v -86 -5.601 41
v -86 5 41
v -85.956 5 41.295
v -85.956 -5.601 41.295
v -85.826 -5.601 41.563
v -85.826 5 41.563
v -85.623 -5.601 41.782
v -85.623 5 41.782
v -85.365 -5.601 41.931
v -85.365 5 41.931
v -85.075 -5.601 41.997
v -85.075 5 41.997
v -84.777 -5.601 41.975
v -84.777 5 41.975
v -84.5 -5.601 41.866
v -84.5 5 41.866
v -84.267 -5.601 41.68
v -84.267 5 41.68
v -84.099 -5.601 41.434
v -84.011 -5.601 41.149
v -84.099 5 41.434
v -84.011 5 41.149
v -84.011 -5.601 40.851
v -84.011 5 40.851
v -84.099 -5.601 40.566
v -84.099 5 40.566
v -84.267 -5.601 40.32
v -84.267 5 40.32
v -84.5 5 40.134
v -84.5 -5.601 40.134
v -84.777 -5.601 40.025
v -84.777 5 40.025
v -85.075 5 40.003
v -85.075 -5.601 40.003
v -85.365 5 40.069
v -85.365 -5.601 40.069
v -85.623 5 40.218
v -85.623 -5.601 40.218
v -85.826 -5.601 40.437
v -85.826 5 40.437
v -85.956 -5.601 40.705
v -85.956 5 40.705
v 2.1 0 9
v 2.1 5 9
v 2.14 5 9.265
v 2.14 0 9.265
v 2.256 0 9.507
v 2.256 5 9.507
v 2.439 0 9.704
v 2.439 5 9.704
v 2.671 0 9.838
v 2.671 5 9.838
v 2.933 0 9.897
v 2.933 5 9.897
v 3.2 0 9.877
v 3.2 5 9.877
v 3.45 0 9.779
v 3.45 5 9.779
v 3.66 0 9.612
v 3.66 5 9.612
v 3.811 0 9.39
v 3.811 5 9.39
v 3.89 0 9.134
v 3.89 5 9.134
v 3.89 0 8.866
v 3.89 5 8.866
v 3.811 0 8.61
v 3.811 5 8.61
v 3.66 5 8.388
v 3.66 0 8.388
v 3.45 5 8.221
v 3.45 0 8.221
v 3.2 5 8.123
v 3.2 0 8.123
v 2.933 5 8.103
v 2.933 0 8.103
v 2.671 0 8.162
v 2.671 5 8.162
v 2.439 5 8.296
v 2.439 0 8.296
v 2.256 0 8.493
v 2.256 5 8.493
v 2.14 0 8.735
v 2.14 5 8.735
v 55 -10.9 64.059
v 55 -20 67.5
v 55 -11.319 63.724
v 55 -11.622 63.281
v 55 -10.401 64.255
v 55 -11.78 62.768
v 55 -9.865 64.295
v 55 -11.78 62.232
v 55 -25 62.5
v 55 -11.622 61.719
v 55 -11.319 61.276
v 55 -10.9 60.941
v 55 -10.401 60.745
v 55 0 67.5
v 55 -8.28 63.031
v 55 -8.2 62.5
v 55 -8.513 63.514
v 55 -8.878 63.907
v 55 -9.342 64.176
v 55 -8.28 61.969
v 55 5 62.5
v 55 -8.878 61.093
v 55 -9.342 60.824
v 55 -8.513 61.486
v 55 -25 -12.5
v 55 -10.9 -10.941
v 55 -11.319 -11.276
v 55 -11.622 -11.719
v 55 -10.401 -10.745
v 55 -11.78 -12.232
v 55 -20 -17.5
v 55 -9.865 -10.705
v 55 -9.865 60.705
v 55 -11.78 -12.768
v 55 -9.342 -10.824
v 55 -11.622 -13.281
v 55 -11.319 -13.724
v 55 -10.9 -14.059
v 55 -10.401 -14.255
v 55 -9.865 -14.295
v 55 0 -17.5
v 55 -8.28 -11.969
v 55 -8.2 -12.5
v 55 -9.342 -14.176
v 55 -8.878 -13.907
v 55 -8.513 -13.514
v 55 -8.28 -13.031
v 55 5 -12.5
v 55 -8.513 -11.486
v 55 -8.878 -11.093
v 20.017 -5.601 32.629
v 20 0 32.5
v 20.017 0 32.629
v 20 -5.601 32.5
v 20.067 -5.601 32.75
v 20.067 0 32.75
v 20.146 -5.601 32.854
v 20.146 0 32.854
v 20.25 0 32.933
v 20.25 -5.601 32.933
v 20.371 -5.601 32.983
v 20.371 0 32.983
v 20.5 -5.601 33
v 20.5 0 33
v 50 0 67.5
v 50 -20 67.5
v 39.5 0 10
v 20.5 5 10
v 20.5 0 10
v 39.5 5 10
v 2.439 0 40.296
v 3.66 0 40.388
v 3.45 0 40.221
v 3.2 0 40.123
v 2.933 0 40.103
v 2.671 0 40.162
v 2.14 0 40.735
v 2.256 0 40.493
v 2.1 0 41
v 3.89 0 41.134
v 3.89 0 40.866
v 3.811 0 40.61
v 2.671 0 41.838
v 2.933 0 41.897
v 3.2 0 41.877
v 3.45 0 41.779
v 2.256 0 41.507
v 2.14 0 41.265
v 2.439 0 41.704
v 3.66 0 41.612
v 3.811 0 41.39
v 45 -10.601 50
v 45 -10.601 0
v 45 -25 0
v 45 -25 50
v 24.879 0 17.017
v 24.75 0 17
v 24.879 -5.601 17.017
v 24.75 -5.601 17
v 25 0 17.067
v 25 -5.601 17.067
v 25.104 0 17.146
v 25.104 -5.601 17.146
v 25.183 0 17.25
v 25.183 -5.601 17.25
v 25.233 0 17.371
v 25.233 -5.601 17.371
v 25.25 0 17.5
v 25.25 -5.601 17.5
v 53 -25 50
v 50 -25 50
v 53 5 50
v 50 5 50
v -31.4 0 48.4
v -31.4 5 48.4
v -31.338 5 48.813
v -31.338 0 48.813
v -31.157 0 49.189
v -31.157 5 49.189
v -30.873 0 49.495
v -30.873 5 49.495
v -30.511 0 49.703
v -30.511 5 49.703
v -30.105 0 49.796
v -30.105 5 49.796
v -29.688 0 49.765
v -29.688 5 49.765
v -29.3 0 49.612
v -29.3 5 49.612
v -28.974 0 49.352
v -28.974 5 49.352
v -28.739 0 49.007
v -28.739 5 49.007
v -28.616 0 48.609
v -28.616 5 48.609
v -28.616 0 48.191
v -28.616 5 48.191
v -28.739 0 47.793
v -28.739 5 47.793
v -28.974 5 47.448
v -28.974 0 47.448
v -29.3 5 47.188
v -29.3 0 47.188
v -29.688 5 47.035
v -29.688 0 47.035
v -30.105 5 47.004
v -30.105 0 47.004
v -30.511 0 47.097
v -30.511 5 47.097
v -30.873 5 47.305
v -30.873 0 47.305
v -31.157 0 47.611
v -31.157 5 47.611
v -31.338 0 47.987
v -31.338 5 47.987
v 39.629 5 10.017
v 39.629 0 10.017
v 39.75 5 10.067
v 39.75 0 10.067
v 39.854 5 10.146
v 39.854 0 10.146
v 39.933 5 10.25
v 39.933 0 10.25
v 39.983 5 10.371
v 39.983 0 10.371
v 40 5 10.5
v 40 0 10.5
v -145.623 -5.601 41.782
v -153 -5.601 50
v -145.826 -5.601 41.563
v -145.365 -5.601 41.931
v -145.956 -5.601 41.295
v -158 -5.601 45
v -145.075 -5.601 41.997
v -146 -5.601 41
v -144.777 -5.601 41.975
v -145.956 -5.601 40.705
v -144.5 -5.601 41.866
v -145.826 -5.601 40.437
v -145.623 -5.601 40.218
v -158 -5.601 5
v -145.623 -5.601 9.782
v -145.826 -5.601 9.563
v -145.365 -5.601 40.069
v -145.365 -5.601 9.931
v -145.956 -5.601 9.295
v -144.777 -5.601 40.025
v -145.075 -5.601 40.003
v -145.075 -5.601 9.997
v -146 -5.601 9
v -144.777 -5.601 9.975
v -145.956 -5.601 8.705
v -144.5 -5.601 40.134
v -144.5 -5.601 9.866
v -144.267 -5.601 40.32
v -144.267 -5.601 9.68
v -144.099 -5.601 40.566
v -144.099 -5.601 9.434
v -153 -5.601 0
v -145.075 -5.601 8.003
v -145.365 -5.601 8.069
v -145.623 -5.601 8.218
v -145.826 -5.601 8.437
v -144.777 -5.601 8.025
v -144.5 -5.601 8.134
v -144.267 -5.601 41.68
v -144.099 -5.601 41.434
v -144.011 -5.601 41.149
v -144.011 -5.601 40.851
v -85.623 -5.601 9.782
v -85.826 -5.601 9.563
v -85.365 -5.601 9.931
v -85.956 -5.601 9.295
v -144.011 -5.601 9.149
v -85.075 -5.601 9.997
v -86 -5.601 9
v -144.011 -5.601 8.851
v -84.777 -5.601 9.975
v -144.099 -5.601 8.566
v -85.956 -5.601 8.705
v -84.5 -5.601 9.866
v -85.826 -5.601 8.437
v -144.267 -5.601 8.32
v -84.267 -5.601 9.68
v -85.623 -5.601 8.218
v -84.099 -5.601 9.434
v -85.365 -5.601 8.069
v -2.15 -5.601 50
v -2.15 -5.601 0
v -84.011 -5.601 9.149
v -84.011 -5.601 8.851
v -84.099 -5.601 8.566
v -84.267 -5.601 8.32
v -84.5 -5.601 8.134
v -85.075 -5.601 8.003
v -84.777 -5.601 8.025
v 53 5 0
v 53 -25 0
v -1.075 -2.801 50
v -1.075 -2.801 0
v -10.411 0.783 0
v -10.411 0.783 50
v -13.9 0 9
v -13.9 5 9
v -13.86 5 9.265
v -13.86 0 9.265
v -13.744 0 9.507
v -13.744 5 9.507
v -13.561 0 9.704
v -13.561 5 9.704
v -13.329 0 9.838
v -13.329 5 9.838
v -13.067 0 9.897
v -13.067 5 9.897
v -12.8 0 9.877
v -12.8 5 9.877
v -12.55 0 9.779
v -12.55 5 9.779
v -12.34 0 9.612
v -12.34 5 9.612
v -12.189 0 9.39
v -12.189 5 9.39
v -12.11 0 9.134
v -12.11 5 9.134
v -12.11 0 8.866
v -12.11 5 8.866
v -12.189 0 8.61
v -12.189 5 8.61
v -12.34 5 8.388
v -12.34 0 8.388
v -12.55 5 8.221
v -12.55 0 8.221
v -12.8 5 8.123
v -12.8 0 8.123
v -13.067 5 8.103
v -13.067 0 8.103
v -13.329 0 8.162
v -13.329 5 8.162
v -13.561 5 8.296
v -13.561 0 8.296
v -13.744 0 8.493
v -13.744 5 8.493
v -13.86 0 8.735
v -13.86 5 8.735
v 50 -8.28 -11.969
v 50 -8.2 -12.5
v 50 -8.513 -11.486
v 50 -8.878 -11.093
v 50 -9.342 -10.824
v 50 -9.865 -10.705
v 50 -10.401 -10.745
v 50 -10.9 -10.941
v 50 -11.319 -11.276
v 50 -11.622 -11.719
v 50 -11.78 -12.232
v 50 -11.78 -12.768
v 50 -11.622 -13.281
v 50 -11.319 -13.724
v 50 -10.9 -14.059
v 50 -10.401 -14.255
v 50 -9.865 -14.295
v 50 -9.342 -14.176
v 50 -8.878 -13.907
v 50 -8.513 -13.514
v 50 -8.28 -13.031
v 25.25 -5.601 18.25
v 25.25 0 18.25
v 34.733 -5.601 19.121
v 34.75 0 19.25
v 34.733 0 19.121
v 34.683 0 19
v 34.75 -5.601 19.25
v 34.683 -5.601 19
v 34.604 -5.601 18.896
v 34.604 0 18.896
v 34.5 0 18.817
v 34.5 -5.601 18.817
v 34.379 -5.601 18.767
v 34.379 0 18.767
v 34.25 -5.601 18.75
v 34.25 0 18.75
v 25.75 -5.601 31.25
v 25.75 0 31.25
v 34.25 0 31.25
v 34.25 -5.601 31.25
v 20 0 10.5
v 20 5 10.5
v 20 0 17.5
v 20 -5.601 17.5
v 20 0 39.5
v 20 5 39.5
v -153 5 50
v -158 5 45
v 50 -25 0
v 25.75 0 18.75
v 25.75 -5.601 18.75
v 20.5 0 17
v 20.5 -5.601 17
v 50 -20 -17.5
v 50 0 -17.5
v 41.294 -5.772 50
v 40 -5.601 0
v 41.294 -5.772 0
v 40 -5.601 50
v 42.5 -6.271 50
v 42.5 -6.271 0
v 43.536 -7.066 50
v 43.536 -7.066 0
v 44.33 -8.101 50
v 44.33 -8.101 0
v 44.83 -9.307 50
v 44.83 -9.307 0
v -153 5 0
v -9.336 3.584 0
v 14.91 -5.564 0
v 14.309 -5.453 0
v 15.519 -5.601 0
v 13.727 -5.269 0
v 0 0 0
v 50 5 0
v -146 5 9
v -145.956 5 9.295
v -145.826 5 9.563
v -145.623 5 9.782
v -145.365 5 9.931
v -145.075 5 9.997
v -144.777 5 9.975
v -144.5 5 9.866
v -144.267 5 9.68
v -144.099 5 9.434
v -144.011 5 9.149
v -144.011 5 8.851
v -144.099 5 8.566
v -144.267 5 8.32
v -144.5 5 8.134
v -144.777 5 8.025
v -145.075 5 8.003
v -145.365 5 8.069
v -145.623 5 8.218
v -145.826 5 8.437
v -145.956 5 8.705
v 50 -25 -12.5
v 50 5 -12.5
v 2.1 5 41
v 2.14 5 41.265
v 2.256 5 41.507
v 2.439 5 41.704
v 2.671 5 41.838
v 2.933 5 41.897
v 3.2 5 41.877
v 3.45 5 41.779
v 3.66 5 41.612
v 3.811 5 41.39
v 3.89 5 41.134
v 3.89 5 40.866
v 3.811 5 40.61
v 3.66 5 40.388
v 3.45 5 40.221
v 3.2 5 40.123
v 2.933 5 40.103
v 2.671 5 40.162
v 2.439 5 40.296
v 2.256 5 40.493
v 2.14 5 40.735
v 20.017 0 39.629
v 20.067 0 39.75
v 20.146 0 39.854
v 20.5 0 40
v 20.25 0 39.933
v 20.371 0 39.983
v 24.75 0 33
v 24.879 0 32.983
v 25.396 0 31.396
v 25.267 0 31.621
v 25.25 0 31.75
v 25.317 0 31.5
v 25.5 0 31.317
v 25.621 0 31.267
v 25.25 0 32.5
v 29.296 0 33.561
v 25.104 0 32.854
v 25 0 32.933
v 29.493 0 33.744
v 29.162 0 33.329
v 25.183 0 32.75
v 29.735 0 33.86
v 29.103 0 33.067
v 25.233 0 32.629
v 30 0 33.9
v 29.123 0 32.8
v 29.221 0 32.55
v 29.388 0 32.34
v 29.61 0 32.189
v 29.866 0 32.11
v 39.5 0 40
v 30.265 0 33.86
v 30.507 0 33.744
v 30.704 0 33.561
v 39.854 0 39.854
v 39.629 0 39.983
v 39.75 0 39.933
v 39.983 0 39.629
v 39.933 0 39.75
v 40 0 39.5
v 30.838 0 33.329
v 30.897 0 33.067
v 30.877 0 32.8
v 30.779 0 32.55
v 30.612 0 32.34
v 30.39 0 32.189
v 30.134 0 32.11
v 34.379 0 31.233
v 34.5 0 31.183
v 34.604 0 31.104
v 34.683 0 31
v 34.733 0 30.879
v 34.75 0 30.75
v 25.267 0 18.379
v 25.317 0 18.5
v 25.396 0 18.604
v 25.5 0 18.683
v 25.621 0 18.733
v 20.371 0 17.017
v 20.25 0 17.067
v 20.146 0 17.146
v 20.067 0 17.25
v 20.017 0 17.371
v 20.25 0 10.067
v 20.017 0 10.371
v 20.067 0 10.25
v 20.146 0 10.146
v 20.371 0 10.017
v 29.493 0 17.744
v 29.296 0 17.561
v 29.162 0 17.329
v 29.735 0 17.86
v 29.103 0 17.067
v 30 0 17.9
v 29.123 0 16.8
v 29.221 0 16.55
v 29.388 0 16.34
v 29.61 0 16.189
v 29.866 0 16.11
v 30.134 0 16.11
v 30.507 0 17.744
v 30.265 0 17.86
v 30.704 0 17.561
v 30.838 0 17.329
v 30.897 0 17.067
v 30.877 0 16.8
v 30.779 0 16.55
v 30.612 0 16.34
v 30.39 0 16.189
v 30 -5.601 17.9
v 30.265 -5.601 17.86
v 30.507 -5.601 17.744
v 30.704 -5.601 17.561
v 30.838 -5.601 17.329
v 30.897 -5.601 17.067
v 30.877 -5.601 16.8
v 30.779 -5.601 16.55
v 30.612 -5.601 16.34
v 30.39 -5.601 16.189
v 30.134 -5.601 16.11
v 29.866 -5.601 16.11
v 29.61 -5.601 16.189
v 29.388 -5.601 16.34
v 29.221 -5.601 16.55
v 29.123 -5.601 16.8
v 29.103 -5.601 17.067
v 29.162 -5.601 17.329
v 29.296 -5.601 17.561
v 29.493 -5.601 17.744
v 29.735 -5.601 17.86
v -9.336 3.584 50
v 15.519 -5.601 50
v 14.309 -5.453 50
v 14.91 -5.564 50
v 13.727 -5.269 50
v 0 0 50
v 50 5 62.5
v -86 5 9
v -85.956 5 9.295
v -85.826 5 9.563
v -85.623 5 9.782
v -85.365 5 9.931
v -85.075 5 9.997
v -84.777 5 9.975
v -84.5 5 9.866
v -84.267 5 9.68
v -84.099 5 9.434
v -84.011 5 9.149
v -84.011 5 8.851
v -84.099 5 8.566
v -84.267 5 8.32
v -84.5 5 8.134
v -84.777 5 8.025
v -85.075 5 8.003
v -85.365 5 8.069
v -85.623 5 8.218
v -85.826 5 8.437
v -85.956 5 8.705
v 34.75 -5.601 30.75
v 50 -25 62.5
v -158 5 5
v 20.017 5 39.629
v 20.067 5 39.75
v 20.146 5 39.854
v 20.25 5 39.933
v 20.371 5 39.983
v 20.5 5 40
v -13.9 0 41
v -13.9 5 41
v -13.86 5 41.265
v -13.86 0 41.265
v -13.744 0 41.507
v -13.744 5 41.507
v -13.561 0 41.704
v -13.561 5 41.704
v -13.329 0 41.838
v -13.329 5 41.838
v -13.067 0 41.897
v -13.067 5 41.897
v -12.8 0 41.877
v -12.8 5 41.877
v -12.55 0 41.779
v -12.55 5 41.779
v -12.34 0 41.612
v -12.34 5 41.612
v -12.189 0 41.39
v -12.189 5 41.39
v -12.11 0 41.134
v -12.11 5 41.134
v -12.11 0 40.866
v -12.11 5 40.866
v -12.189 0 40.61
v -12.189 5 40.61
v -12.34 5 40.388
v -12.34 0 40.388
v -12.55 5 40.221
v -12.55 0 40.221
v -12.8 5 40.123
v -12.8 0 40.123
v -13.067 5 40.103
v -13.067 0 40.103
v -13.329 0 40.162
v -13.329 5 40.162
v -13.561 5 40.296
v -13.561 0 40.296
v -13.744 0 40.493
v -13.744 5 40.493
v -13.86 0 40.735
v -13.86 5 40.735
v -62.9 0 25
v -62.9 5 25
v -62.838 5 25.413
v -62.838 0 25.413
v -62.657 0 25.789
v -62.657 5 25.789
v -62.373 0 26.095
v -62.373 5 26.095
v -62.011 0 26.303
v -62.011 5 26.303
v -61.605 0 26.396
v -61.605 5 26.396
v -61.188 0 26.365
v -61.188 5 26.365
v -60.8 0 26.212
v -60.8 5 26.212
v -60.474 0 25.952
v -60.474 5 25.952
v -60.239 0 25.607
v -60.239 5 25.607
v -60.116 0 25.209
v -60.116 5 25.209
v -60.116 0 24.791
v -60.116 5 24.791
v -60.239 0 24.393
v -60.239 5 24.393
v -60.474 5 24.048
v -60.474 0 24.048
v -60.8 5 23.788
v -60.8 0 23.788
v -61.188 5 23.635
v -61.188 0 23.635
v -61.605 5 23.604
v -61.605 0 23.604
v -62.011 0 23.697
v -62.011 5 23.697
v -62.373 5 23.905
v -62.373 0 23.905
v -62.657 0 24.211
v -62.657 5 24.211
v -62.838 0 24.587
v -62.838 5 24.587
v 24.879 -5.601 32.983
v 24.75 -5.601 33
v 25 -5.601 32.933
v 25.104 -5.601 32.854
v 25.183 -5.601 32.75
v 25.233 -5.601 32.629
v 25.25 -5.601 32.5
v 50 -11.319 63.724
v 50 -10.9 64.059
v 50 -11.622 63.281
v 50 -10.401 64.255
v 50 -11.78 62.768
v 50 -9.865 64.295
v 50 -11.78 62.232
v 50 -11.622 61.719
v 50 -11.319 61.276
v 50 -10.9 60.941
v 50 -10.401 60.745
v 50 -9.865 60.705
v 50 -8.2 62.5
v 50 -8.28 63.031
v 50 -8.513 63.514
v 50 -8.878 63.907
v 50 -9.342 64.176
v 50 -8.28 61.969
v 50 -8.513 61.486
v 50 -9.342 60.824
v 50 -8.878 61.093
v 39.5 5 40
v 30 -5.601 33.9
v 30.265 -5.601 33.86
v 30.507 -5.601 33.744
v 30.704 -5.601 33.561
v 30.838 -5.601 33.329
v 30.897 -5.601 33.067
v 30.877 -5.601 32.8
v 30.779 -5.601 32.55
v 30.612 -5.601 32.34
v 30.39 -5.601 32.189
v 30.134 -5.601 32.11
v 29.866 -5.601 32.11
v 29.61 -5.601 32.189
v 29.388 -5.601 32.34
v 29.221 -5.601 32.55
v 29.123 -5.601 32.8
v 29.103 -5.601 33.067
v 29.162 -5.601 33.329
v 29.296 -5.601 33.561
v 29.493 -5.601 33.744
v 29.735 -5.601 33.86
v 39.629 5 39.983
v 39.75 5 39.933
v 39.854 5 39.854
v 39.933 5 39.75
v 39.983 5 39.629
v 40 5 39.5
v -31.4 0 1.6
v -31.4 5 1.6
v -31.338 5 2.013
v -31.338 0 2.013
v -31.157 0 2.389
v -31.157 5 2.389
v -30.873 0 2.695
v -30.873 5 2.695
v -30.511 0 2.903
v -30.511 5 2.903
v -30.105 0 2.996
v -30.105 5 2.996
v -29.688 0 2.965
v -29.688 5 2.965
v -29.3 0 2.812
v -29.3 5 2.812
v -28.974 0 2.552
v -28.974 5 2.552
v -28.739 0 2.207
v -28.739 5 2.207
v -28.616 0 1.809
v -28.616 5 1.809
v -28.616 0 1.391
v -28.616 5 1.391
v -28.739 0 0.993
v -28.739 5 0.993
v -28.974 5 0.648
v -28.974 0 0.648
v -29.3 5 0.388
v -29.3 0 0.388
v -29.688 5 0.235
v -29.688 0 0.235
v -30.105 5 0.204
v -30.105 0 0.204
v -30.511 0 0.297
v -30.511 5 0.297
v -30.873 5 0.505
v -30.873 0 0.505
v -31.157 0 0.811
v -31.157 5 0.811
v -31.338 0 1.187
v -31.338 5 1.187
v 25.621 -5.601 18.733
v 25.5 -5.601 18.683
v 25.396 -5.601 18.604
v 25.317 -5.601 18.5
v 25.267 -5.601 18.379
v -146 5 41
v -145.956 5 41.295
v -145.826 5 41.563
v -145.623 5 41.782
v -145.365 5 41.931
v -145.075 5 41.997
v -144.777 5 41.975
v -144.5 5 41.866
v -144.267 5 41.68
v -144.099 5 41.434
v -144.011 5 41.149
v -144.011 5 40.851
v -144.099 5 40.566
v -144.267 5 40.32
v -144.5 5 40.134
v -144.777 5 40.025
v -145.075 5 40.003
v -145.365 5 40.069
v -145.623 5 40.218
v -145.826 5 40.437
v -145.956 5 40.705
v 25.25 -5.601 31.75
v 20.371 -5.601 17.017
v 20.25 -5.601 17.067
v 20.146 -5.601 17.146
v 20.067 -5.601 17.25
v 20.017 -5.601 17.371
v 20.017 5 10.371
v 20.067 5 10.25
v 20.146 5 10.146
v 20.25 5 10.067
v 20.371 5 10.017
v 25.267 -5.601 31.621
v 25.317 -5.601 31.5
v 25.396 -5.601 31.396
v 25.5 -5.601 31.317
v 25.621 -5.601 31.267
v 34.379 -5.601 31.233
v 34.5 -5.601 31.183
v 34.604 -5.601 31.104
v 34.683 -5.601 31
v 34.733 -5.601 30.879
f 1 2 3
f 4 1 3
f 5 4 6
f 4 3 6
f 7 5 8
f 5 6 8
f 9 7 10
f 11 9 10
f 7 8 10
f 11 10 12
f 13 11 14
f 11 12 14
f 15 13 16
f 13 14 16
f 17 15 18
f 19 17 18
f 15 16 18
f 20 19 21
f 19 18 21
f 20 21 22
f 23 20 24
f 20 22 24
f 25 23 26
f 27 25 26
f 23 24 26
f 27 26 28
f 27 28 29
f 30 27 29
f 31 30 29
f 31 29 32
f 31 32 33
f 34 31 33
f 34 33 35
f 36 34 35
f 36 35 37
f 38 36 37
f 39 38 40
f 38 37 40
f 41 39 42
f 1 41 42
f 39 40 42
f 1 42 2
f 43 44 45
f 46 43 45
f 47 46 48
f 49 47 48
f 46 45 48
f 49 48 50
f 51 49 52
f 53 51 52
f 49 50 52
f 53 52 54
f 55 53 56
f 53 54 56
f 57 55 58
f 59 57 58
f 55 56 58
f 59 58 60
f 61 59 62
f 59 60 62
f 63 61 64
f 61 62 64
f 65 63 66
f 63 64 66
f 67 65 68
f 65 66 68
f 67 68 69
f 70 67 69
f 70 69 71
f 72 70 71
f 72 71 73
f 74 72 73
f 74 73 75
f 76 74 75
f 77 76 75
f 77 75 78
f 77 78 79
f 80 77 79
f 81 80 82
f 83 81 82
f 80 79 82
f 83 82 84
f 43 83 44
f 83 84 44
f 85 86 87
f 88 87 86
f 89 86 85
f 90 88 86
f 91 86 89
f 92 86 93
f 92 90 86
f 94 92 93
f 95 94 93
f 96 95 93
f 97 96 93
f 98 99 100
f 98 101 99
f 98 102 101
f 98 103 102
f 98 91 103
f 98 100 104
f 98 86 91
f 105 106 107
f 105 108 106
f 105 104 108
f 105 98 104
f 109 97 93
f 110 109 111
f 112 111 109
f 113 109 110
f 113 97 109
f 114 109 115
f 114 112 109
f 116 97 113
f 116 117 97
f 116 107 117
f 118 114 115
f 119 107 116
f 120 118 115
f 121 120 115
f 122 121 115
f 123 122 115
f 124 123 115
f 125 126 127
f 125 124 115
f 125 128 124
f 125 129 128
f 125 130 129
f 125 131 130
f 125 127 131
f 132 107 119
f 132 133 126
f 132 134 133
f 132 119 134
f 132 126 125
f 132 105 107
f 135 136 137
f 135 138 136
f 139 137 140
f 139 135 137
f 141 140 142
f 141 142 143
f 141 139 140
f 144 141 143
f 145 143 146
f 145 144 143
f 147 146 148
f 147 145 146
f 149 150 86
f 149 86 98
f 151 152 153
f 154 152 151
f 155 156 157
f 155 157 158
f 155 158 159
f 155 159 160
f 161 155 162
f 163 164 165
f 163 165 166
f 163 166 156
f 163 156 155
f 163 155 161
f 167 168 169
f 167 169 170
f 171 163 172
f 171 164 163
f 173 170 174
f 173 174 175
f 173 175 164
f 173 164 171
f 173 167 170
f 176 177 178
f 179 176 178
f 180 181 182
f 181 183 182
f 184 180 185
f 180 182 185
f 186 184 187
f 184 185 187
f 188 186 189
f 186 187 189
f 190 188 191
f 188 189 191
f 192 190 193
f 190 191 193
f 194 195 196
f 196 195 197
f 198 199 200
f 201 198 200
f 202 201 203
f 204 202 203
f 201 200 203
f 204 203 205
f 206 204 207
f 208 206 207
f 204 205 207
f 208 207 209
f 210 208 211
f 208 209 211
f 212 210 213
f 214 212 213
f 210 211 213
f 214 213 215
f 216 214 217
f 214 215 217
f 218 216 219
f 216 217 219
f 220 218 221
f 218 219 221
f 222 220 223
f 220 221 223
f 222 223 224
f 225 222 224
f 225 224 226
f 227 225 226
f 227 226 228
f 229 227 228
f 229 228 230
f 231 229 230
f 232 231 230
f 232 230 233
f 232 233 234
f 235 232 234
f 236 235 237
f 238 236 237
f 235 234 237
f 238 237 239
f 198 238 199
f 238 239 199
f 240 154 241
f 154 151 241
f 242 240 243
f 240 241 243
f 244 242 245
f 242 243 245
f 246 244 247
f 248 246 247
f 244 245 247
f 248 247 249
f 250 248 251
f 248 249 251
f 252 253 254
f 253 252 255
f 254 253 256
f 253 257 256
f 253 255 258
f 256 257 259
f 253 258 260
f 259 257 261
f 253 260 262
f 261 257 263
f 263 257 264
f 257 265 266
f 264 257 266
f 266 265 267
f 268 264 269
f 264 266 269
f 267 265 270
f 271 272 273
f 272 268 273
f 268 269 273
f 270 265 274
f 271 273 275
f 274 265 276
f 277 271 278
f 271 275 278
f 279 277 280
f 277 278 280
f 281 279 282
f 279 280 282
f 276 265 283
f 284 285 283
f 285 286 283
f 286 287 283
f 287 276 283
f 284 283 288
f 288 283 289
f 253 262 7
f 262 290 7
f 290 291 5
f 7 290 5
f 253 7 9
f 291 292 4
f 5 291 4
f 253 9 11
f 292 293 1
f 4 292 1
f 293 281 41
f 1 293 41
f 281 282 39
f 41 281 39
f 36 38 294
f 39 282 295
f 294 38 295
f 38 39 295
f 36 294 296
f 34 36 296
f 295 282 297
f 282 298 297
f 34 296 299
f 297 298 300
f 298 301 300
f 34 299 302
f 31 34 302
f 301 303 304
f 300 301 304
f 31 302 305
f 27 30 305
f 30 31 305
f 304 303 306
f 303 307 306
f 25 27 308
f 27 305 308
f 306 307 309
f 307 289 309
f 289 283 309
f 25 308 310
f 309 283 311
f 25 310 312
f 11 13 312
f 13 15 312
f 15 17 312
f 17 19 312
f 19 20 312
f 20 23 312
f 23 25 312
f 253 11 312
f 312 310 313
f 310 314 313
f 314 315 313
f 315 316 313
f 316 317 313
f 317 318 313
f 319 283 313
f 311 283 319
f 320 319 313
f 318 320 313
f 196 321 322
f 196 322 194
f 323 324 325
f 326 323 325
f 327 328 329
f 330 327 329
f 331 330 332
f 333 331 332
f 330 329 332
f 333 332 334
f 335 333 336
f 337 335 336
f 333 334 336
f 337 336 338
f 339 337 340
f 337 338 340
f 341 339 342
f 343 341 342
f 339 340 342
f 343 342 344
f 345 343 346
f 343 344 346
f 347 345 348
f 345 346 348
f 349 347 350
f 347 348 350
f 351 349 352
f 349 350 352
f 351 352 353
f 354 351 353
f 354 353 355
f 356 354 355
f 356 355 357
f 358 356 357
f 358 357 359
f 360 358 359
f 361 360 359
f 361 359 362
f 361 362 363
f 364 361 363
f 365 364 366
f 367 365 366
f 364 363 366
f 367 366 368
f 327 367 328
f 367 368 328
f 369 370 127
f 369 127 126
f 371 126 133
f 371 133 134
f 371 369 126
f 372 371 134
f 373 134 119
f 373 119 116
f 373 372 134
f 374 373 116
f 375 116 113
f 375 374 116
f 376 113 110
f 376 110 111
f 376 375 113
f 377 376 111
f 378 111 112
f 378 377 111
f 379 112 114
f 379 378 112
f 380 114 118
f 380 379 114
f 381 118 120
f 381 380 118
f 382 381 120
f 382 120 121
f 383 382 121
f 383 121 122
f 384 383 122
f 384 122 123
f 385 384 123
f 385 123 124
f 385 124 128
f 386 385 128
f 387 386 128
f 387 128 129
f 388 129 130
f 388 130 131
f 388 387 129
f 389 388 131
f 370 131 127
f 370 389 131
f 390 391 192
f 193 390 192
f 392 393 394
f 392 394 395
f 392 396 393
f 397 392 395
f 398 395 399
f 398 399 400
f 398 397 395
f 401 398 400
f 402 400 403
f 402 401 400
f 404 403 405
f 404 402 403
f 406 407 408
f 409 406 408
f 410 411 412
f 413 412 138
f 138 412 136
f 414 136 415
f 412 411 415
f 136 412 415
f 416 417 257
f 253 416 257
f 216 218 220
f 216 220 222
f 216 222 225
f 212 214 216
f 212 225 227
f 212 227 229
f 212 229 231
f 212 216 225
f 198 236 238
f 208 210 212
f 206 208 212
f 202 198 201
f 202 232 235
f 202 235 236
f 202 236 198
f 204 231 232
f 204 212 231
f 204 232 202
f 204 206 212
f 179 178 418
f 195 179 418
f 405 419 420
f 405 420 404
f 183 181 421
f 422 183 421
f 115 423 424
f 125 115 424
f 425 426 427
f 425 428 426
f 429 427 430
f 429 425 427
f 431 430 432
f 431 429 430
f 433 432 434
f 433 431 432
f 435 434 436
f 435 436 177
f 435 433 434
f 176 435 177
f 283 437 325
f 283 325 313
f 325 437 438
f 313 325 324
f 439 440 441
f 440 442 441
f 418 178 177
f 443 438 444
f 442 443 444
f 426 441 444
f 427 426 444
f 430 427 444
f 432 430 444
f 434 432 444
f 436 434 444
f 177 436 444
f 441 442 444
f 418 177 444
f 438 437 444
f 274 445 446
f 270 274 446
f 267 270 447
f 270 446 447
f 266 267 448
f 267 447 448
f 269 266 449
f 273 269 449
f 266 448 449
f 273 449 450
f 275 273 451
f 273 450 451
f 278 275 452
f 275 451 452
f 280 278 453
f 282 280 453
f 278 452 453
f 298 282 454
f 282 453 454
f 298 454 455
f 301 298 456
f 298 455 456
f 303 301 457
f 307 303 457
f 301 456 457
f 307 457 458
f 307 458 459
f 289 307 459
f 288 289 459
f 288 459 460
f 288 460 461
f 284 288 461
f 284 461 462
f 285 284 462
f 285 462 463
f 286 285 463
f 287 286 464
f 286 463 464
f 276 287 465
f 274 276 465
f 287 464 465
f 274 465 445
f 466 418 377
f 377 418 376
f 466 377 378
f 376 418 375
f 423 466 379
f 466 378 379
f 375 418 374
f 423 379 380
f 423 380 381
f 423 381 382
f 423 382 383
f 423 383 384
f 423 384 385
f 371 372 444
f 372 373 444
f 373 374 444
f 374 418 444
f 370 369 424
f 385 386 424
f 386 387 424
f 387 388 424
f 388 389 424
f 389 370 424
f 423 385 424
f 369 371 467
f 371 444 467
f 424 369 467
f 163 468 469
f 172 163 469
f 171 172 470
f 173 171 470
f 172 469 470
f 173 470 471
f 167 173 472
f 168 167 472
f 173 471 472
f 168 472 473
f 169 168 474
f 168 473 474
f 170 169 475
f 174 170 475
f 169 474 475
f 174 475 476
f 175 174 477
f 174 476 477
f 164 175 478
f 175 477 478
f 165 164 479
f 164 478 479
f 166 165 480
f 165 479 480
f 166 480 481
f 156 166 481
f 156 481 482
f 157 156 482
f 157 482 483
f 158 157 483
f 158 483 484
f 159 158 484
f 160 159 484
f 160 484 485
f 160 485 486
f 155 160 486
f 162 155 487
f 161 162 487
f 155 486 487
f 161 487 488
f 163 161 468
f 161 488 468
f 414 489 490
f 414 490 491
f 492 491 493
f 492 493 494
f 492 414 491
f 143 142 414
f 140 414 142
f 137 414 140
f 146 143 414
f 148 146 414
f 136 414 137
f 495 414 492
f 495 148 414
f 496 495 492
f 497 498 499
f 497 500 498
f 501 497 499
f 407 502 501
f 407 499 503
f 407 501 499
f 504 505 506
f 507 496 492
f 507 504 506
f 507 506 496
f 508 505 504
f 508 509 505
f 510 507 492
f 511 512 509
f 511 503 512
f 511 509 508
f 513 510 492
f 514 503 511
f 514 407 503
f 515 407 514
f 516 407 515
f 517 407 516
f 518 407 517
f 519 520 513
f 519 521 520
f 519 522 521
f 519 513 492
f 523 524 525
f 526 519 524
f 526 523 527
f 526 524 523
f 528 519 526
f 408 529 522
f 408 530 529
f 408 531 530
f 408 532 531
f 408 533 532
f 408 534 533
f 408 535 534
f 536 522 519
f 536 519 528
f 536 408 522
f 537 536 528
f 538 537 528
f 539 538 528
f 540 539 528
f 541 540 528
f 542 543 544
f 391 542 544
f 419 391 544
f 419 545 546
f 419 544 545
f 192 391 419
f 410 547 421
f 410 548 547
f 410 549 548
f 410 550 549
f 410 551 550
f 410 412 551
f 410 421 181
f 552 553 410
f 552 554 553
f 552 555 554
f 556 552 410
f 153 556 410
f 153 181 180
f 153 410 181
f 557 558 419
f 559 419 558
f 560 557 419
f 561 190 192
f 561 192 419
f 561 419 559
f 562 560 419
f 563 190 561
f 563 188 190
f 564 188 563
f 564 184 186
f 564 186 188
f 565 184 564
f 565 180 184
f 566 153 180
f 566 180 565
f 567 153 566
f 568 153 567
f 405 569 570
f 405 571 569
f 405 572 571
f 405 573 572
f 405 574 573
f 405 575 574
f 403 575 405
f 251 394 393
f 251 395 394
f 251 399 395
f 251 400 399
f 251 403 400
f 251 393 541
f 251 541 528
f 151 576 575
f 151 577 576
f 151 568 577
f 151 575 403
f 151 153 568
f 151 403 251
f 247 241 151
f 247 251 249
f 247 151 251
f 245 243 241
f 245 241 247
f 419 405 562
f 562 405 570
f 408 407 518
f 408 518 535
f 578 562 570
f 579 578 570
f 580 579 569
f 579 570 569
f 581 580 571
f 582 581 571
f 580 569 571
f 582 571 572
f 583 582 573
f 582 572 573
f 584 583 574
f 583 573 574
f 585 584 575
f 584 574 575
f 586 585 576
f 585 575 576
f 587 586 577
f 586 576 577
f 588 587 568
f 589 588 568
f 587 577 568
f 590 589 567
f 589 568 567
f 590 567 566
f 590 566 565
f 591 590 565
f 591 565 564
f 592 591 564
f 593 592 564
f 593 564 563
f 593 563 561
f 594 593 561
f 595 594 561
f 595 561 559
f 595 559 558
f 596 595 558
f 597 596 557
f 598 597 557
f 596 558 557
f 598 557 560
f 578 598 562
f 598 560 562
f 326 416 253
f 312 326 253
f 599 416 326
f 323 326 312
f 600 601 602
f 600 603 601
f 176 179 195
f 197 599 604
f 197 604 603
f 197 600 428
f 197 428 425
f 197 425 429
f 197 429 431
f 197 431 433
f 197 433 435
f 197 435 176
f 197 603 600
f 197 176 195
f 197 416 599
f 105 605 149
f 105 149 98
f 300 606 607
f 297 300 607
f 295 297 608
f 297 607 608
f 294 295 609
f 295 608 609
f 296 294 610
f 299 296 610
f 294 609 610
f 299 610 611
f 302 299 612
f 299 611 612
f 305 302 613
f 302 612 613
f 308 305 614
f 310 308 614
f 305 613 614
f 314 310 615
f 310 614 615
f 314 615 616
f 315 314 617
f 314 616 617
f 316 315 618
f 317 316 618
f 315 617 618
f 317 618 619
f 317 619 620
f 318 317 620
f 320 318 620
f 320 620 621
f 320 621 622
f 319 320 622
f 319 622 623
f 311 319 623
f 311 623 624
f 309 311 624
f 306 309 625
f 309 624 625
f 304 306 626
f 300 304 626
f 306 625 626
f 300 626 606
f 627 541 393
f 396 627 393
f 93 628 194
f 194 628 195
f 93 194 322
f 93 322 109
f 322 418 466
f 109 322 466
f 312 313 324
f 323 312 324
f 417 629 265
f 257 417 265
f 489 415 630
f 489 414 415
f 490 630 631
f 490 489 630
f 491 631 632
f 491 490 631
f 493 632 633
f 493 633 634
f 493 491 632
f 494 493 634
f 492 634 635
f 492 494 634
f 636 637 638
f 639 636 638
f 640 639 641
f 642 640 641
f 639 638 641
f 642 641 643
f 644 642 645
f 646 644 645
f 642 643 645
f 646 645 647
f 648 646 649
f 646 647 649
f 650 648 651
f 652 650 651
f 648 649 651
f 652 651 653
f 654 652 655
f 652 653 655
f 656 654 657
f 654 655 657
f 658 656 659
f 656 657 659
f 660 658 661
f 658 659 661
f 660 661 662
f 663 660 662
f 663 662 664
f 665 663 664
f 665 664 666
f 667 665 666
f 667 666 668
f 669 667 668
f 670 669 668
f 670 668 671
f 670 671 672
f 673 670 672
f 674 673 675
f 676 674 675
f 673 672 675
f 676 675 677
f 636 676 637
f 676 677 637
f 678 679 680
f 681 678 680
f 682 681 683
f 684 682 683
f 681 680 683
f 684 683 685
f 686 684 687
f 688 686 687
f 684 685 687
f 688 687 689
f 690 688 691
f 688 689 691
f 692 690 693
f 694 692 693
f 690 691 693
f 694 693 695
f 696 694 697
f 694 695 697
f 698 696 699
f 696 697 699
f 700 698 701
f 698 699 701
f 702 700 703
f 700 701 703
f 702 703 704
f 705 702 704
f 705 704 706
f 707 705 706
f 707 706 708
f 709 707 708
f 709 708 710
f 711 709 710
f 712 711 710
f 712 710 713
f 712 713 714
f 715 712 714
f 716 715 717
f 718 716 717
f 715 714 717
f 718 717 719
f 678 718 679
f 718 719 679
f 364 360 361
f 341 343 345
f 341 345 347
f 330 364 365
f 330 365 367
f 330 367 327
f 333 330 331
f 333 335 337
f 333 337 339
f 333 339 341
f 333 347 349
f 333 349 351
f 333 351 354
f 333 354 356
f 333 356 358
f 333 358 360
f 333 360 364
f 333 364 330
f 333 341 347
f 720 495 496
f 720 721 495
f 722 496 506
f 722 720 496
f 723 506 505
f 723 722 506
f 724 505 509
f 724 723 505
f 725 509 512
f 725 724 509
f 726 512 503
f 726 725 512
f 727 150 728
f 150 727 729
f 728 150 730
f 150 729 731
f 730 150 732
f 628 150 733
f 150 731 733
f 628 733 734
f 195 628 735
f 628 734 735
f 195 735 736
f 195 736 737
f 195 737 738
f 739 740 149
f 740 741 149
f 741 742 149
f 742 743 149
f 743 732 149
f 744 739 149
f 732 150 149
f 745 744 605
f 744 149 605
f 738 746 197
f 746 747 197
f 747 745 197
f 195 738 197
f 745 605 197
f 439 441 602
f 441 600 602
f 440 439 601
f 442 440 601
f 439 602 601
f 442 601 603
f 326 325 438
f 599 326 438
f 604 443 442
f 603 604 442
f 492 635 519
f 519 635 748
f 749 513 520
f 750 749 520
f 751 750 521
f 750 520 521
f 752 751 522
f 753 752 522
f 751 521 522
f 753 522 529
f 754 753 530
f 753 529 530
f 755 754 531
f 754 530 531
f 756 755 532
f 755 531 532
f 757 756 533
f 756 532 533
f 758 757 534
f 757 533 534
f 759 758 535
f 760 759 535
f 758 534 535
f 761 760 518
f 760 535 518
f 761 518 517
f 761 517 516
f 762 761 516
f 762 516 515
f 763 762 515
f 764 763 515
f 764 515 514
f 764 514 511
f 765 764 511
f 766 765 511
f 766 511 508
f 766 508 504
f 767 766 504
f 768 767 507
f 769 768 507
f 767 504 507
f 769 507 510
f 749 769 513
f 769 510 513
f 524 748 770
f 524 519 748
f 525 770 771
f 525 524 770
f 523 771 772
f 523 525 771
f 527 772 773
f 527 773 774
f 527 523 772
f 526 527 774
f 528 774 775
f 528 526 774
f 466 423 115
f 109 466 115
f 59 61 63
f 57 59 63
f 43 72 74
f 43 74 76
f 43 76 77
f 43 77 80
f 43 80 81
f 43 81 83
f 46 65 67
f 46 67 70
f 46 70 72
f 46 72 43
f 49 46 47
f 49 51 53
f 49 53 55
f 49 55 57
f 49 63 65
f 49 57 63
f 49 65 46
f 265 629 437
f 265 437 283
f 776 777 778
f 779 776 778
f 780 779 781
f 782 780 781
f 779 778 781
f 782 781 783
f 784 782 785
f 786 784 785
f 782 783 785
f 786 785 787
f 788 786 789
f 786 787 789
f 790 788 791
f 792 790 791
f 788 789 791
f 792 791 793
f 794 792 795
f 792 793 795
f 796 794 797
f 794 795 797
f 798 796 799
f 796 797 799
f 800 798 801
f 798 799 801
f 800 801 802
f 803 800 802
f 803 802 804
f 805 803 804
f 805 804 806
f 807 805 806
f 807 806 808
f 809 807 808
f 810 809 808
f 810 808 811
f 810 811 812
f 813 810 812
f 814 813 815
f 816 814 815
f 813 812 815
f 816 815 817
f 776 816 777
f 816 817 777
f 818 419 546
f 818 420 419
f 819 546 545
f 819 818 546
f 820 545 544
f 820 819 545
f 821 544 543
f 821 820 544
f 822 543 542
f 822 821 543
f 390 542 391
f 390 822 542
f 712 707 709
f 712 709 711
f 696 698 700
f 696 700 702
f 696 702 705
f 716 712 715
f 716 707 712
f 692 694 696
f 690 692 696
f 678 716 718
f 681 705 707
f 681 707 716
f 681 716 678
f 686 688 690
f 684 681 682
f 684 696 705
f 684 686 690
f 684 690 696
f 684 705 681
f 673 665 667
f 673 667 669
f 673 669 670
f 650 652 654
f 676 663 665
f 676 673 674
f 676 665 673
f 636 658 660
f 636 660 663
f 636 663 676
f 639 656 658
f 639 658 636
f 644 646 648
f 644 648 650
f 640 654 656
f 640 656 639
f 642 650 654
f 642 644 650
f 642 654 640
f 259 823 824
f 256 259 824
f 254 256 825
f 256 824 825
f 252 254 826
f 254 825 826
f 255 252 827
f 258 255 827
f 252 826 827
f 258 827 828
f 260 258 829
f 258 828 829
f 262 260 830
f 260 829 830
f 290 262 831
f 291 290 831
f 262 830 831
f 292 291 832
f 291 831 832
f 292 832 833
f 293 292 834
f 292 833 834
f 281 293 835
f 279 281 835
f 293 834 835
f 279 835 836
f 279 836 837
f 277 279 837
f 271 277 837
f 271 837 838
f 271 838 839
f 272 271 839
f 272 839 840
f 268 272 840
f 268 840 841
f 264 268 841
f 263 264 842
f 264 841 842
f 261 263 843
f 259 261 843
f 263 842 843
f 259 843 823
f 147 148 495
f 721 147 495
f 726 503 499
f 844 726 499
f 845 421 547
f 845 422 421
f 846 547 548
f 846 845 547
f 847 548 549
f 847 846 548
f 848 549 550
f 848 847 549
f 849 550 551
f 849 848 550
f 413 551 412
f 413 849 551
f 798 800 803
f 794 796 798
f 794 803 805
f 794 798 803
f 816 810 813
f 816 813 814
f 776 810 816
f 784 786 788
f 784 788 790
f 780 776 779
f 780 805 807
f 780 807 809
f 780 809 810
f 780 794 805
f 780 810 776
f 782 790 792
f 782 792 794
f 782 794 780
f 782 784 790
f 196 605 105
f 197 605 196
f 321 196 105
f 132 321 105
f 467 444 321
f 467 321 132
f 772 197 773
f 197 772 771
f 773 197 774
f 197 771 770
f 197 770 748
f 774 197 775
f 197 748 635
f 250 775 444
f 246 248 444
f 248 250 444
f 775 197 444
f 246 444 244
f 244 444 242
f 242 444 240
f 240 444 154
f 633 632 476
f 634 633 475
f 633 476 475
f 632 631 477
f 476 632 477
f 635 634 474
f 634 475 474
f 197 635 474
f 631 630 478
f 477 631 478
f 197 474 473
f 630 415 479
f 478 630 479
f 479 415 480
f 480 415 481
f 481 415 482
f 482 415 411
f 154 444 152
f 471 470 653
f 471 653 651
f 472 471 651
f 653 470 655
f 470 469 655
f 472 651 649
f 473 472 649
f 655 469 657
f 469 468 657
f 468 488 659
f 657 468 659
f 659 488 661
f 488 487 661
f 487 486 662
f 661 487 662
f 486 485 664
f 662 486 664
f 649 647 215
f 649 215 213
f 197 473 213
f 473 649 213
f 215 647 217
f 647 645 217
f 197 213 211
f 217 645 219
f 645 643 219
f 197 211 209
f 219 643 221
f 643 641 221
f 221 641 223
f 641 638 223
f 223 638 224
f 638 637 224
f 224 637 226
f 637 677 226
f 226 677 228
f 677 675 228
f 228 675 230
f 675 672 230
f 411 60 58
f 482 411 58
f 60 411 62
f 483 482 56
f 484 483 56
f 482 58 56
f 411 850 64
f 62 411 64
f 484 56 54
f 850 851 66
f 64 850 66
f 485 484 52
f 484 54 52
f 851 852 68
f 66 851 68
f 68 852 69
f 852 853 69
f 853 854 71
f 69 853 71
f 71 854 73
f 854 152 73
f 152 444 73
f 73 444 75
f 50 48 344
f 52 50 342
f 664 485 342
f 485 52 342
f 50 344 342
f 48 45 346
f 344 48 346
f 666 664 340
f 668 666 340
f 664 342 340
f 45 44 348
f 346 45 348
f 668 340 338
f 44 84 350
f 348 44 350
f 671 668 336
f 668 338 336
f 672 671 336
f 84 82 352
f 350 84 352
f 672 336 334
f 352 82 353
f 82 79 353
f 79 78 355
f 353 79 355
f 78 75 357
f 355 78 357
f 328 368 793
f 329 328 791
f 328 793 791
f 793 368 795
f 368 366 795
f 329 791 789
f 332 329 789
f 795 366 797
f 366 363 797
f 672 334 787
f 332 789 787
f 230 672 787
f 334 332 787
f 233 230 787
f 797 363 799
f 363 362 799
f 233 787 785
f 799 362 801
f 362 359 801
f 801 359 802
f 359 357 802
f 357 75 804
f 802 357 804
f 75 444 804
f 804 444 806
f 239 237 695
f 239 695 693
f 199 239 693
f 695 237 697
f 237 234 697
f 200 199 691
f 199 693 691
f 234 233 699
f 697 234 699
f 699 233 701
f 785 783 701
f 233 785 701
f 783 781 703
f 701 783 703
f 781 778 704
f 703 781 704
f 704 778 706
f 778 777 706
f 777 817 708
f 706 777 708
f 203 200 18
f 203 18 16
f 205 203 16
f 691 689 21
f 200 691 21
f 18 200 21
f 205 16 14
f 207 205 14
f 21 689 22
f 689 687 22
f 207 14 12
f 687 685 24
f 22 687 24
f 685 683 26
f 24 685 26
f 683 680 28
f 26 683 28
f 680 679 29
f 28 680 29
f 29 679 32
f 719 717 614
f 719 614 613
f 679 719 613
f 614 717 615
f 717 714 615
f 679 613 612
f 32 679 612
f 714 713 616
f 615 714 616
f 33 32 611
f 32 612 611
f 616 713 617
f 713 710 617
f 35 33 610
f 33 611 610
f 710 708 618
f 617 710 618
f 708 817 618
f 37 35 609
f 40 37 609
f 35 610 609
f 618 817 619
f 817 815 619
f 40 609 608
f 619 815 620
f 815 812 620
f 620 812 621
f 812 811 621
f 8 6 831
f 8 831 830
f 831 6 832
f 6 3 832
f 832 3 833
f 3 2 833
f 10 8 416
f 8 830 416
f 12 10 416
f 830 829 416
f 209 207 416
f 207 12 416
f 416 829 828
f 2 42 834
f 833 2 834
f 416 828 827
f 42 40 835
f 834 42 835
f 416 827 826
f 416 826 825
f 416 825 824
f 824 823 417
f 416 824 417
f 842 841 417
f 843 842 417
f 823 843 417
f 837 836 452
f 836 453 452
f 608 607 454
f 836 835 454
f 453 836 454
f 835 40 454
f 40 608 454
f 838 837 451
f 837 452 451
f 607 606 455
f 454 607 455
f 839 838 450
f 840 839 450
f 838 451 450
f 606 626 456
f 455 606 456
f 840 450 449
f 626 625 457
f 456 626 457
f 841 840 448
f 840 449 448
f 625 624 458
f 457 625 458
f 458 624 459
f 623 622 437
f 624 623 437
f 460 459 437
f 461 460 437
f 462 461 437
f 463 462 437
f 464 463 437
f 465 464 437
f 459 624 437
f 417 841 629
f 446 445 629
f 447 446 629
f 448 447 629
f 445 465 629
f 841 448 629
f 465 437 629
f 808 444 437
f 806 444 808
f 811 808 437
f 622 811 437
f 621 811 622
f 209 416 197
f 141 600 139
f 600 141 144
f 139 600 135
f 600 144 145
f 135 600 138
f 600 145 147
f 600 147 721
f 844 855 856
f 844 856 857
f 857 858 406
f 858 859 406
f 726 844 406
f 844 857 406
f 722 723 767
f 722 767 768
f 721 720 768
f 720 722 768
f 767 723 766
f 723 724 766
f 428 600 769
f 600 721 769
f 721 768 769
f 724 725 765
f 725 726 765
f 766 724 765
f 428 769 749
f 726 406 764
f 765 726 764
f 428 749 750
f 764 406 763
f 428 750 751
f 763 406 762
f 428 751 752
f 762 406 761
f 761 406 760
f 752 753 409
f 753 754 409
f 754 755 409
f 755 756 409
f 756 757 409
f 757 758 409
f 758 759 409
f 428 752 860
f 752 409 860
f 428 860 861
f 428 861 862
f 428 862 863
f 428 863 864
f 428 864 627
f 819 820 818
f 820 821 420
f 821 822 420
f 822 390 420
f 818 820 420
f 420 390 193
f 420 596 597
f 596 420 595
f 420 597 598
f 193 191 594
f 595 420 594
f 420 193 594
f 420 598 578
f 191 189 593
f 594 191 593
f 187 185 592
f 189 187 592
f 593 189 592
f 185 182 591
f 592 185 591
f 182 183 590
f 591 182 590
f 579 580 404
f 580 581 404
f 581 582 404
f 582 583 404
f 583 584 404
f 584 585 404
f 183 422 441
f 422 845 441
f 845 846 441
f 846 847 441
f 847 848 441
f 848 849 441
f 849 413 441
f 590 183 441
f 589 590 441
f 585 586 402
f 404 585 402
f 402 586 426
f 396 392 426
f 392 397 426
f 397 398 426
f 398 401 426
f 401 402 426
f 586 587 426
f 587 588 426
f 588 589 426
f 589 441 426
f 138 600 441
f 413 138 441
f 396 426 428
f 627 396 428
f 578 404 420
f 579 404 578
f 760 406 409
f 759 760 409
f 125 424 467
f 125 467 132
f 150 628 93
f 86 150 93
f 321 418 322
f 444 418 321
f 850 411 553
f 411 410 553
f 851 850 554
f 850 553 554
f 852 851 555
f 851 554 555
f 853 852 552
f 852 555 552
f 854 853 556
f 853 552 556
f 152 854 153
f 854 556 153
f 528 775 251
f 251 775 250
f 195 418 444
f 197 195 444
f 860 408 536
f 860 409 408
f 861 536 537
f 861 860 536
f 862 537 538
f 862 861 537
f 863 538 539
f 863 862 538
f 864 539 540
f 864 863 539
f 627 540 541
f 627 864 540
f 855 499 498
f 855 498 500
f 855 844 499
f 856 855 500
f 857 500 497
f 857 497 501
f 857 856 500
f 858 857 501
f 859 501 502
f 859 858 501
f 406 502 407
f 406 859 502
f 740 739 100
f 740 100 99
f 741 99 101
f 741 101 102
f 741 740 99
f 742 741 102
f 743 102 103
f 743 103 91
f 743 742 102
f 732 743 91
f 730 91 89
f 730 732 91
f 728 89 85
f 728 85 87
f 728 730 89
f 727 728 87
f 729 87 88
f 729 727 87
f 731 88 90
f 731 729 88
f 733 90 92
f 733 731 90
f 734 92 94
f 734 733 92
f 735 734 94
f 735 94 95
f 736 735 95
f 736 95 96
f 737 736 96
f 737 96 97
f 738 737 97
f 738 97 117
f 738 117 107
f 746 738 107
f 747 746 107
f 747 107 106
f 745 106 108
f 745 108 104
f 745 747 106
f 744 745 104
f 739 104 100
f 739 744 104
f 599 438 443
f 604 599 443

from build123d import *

# Parameters (mm, degrees)
BOSS_EXTRUDE1_DEPTH = 50
SKETCH3_W           = 85
SKETCH3_H           = 30
SKETCH3_R           = 1.8
BOSS_EXTRUDE2_DEPTH = 5
SKETCH4_W           = 50
SKETCH4_H           = 30
CUT_EXTRUDE1_DEPTH  = 3
SKETCH5_R           = 0.9
SKETCH5_R_2         = 1.4
SKETCH5_W           = 20
SKETCH5_H           = 30
CUT_EXTRUDE2_DEPTH  = 5
SKETCH7_W           = 9.5
SKETCH7_H           = 12.5
SKETCH7_R           = 0.9
CUT_EXTRUDE4_DEPTH  = 5.601482559
SKETCH8_R           = 1
CUT_EXTRUDE5_DEPTH  = 10.601482559
FILLET2_R           = 0.5
CHAMFER1_SIZE       = 5
FILLET1_R           = 5
CHAMFER2_SIZE       = 5


with BuildPart() as part:
    # Sketch1 → Boss-Extrude1 (new body)
    with BuildSketch(Plane.XY):
        Polygon((-9.335804265, 3.583679495), (0, 0), (14.59236096, -5.601482559), (45, -5.601482559), (45, -25), (50, -25), (50, 5), (0, 5), (-18, 5), (-158, 5), (-158, -5.601482559), (-2.150207697, -5.601482559), (-1.075103849, -2.800741279), (-10.410908114, 0.782938216), align=None)
    extrude(amount=BOSS_EXTRUDE1_DEPTH)

    # Sketch5 → Cut-Extrude2 (cut)
    with BuildSketch(Plane(origin=(0, 5, 0), x_dir=(1, 0, 0), z_dir=(0, 1, 0))):
        with Locations(Location((3, -9, 0), (0, 0, 180))):
            Circle(SKETCH5_R)
        with Locations(Location((-13, -9, 0), (0, 0, 180))):
            Circle(SKETCH5_R)
        with Locations(Location((-13, -41, 0), (0, 0, 180))):
            Circle(SKETCH5_R)
        with Locations(Location((3, -41, 0), (0, 0, 180))):
            Circle(SKETCH5_R)
        with Locations(Location((-30, -1.6, 0), (0, 0, 180))):
            Circle(SKETCH5_R_2)
        with Locations(Location((-30, -48.4, 0), (0, 0, 180))):
            Circle(SKETCH5_R_2)
        with Locations(Location((-61.5, -25, 0), (0, 0, 180))):
            Circle(SKETCH5_R_2)
        with Locations((30, -25)):
            Rectangle(SKETCH5_W, SKETCH5_H)
    extrude(amount=-CUT_EXTRUDE2_DEPTH, mode=Mode.SUBTRACT)

    # Sketch7 → Cut-Extrude4 (cut)
    with BuildSketch(Plane(origin=(0, 0, 0), x_dir=(1, 0, 0), z_dir=(0, 1, 0))):
        Polygon((25.25, -31.25), (25.25, -18.75), (25.25, -17), (20, -17), (20, -33), (25.25, -33), align=None)
        with Locations((30, -25)):
            Rectangle(SKETCH7_W, SKETCH7_H)
        with Locations(Location((30, -17, 0), (0, 0, 270))):
            Circle(SKETCH7_R)
        with Locations(Location((30, -33, 0), (0, 0, 270))):
            Circle(SKETCH7_R)
    extrude(amount=-CUT_EXTRUDE4_DEPTH, mode=Mode.SUBTRACT)

    # Sketch8 → Cut-Extrude5 (cut)
    with BuildSketch(Plane(origin=(0, 5, 0), x_dir=(1, 0, 0), z_dir=(0, 1, 0))):
        with Locations(Location((-85, -41, 0), (0, 0, 180))):
            Circle(SKETCH8_R)
        with Locations(Location((-85, -9, 0), (0, 0, 180))):
            Circle(SKETCH8_R)
        with Locations(Location((-145, -9, 0), (0, 0, 180))):
            Circle(SKETCH8_R)
        with Locations(Location((-145, -41, 0), (0, 0, 180))):
            Circle(SKETCH8_R)
    extrude(amount=-CUT_EXTRUDE5_DEPTH, mode=Mode.SUBTRACT)

    # Fillet2
    fillet2_edges = [part.edges().sort_by_distance(p)[0] for p in [
        (25.25, -2.800741279, 31.25),
        (34.75, -2.800741279, 31.25),
        (34.75, -2.800741279, 18.75),
        (25.25, -2.800741279, 18.75),
        (25.25, -2.800741279, 17),
        (20, -2.800741279, 17),
        (20, -2.800741279, 33),
        (25.25, -2.800741279, 33),
        (40, 2.5, 10),
        (40, 2.5, 40),
        (20, 2.5, 40),
        (20, 2.5, 10),
    ]]
    fillet(fillet2_edges, radius=FILLET2_R)

    # Fillet1
    fillet1_edges = [part.edges().sort_by_distance(p)[0] for p in [
        (45, -5.601482559, 25),
        (14.59236096, -5.601482559, 25),
    ]]
    fillet(fillet1_edges, radius=FILLET1_R)

    # Chamfer2
    chamfer2_edges = [part.edges().sort_by_distance(p)[0] for p in [
        (-158, -0.300741279, 0),
        (-158, -0.300741279, 50),
    ]]
    chamfer(chamfer2_edges, length=CHAMFER2_SIZE)


with BuildPart() as body_2:
    # Sketch3 → Boss-Extrude2 (new body)
    with BuildSketch(Plane(origin=(50, 0, 0), x_dir=(0, 0, -1), z_dir=(1, 0, 0))):
        with Locations((-25, -10)):
            Rectangle(SKETCH3_W, SKETCH3_H)
        with Locations(Location((-62.5, -10, 0), (0, 0, 90))):
            Circle(SKETCH3_R, mode=Mode.SUBTRACT)
        with Locations(Location((12.5, -10, 0), (0, 0, 90))):
            Circle(SKETCH3_R, mode=Mode.SUBTRACT)
    extrude(amount=BOSS_EXTRUDE2_DEPTH)

    # Sketch4 → Cut-Extrude1 (cut)
    with BuildSketch(Plane.ZY.offset(-50)):
        with Locations((25, -10)):
            Rectangle(SKETCH4_W, SKETCH4_H)
    extrude(amount=-CUT_EXTRUDE1_DEPTH, mode=Mode.SUBTRACT)

    # Chamfer1
    chamfer1_edges = [body_2.edges().sort_by_distance(p)[0] for p in [
        (52.5, 5, 67.5),
        (52.5, 5, -17.5),
        (52.5, -25, -17.5),
        (52.5, -25, 67.5),
    ]]
    chamfer(chamfer1_edges, length=CHAMFER1_SIZE)


solid = Compound([part.part, body_2.part])
